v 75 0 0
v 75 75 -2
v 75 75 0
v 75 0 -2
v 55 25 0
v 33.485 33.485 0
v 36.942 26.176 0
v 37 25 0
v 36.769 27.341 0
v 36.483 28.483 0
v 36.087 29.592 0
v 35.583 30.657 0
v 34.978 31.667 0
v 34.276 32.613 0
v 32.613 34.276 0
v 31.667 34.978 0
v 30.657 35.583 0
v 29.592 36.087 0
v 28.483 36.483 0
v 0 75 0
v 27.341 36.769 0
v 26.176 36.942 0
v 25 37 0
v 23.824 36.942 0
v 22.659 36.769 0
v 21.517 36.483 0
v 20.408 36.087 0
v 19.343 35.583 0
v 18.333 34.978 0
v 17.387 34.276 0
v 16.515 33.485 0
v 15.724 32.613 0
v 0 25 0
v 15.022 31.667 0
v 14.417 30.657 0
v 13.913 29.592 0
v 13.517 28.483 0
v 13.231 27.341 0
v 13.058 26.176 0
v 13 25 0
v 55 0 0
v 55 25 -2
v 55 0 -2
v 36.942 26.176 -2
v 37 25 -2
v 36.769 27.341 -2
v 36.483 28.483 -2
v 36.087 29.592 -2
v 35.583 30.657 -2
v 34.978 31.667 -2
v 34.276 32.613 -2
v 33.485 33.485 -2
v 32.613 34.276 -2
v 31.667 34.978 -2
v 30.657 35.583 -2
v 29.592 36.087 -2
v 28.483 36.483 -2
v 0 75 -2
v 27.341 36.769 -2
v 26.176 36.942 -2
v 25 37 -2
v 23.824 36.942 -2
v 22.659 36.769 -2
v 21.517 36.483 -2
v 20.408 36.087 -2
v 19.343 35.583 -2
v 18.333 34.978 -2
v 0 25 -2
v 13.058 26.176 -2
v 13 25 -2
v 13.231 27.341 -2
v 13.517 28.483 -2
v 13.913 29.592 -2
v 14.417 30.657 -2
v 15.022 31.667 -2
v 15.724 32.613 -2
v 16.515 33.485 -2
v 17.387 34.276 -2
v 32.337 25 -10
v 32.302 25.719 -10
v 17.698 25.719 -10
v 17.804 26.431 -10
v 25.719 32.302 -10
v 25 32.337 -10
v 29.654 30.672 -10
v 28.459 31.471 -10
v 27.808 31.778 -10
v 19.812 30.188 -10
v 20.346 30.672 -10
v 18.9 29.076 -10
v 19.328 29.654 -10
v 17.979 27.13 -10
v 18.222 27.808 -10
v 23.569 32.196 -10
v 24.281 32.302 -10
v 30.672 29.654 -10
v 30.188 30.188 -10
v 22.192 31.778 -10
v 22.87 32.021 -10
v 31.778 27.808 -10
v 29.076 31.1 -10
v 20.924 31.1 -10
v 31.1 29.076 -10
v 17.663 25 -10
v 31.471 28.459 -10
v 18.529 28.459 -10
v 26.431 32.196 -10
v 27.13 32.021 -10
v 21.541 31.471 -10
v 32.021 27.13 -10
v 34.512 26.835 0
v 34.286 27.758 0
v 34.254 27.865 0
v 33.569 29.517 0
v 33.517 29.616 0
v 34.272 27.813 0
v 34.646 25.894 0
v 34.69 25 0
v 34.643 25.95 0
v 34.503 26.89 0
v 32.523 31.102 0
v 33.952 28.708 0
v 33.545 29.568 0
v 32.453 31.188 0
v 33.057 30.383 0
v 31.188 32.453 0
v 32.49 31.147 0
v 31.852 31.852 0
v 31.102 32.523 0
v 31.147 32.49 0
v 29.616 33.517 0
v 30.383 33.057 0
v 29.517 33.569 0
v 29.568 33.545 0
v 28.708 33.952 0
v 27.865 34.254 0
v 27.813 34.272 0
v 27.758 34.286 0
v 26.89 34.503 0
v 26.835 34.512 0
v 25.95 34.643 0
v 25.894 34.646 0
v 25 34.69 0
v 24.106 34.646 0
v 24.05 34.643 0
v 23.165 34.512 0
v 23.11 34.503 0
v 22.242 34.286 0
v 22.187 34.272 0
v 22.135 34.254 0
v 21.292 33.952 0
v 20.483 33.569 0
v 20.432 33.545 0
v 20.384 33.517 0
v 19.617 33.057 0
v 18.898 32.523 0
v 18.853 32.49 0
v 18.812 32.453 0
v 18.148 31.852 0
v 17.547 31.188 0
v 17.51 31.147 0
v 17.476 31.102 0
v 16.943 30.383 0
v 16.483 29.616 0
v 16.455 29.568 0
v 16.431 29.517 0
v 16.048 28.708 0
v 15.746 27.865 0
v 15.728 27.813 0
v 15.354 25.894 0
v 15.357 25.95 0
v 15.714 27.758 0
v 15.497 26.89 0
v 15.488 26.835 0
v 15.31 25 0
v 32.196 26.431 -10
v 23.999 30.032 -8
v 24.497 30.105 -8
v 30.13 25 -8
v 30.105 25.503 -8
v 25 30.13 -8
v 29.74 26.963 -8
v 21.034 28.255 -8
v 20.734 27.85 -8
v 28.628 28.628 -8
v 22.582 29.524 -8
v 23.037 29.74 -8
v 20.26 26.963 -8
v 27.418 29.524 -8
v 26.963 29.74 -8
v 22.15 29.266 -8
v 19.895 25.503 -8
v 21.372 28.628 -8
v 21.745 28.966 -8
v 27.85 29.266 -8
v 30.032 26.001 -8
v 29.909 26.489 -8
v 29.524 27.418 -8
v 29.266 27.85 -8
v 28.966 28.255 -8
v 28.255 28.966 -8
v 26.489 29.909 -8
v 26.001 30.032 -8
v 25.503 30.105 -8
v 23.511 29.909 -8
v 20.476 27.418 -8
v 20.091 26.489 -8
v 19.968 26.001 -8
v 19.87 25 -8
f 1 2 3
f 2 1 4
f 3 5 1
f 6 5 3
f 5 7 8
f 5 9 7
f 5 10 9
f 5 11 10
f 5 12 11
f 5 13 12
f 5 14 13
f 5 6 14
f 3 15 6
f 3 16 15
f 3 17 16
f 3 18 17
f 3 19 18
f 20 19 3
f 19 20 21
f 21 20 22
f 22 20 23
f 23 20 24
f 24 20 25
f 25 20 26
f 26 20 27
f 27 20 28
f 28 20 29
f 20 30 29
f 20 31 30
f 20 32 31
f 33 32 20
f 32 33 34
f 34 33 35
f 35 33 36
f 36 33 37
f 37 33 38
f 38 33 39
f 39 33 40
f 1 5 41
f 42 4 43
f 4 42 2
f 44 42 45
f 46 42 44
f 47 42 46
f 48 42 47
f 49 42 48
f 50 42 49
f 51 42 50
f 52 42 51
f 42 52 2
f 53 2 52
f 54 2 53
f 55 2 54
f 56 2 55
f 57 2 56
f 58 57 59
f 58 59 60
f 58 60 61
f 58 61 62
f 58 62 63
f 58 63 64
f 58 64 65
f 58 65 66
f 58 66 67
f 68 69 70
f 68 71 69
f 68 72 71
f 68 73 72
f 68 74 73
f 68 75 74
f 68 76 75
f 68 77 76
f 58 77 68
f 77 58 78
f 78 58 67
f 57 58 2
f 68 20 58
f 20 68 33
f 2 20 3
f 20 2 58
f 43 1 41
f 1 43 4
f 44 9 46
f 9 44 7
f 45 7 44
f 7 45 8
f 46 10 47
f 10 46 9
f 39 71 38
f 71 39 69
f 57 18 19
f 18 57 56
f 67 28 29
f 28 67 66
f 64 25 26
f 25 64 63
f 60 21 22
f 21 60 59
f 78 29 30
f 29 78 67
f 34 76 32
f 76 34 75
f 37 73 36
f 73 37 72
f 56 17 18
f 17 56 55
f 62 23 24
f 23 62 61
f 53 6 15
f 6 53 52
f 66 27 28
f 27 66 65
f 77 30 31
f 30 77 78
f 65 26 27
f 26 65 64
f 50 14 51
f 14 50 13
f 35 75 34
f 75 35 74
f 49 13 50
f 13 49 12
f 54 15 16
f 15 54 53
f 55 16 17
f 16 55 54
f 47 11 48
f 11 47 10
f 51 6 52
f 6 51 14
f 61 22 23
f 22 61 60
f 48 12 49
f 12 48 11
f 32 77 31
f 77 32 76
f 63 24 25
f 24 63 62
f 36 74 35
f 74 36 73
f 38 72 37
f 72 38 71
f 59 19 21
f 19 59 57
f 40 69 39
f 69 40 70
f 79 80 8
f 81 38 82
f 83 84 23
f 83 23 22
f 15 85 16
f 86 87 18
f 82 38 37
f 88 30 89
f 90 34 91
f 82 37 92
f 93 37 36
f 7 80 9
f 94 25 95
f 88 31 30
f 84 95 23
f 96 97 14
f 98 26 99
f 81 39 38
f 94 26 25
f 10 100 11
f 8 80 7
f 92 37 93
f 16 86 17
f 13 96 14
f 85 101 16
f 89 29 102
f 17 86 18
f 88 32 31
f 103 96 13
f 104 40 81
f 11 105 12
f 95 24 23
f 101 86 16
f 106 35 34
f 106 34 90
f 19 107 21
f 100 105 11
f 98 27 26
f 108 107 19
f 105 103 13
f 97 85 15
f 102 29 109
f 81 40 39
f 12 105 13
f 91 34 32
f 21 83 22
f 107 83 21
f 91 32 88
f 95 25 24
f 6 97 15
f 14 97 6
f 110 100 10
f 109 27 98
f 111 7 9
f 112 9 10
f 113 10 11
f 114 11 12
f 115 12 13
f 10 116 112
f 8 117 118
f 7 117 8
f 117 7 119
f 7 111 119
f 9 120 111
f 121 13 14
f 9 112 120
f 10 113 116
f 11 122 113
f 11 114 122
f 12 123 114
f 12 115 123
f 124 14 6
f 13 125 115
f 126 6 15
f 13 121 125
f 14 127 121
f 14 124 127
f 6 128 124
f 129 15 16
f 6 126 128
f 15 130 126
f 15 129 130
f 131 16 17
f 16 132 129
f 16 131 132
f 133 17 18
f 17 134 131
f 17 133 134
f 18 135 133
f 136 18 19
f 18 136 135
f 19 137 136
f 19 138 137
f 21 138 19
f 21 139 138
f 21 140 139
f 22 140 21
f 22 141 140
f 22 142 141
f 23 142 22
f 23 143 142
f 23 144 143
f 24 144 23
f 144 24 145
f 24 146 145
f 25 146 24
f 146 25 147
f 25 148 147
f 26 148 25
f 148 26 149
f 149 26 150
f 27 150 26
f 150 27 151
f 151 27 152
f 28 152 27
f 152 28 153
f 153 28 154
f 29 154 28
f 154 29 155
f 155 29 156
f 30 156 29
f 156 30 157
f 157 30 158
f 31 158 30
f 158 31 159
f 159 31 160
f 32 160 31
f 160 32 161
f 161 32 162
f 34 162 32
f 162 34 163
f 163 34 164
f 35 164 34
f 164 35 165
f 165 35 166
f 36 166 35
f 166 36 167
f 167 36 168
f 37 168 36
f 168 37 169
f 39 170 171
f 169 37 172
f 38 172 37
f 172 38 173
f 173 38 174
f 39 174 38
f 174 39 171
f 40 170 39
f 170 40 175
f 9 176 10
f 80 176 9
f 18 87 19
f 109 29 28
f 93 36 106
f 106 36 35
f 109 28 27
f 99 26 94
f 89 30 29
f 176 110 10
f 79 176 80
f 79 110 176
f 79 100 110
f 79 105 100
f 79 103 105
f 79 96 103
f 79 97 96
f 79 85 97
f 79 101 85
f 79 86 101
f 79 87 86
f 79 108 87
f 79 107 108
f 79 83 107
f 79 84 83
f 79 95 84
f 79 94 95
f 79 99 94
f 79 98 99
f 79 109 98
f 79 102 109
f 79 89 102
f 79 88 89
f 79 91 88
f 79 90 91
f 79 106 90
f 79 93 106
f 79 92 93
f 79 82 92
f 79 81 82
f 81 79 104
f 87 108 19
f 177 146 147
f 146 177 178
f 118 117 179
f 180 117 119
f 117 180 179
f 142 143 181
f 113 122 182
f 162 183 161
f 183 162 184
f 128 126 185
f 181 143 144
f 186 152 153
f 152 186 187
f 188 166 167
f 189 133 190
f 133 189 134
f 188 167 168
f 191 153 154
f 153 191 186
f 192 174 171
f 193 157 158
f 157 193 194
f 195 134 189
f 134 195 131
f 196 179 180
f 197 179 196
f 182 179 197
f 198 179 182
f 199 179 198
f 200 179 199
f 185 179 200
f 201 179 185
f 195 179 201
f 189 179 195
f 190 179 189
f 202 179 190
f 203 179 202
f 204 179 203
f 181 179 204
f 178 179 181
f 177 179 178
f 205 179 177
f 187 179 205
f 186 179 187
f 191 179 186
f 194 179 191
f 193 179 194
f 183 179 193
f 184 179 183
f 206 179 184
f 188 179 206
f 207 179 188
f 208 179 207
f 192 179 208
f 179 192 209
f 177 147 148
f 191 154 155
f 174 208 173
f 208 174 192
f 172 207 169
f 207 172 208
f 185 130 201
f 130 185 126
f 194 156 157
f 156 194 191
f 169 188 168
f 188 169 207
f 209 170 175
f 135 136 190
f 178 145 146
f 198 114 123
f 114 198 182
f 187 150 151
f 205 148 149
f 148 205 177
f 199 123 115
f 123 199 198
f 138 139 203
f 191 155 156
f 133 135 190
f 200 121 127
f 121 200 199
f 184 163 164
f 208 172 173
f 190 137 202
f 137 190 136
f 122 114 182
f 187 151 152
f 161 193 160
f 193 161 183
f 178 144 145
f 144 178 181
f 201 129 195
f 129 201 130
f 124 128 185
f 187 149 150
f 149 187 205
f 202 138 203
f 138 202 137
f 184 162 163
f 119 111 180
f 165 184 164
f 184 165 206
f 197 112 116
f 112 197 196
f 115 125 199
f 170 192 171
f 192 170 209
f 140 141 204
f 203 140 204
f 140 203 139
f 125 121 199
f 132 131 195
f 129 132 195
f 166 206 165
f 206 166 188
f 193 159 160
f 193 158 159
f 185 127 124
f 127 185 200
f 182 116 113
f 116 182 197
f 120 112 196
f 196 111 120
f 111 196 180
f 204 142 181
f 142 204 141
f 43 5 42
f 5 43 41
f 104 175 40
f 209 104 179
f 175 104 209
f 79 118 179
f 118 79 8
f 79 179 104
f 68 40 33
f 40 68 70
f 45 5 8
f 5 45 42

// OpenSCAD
// --------------------------------------------------------
// Parametric Sheet Metal Dimple / Dowel Simulation
// --------------------------------------------------------

module dimpled_plate(length, width, thickness, dimple_x, dimple_y, radius, depth, draft_angle) {
    
    // 1. Calculate horizontal thickness offset to maintain normal wall thickness
    t_h = thickness / cos(draft_angle);
    
    // 2. Calculate Outer Cone Radii (The exterior metal surface)
    r_out_top = radius;
    r_out_bot = radius - (depth + thickness) * tan(draft_angle);
    
    // 3. Calculate Inner Cone Radii (The air / stamping punch)
    r_in_top = r_out_top - t_h;
    r_in_bot = r_out_bot - t_h;

    union() {
        // --- BASE PLATE ---
        difference() {
            // Position plate so the top face is at Z = 0
            translate([0, 0, -thickness])
                cube([length, width, thickness]);
            
            // Cut a hole exactly where the dimple begins
            translate([dimple_x, dimple_y, -thickness - 1])
                cylinder(h = thickness + 2, r = radius, $fn = 64);
        }
        
        // --- DIMPLE SHELL ---
        translate([dimple_x, dimple_y, 0]) {
            difference() {
                // The Outer Solid (Metal)
                translate([0, 0, -(depth + thickness)])
                    cylinder(h = depth + thickness, r1 = r_out_bot, r2 = r_out_top, $fn = 64);
                    
                // The Inner Cutout (Air)
                // We make the height +1 to ensure a clean Boolean cut at the top
                translate([0, 0, -depth])
                    cylinder(h = depth + 1, r1 = r_in_bot, r2 = r_in_top + 1 * tan(draft_angle), $fn = 64);
            }
        }
    }
}

// ==========================================
// Example Render (With Cross-Section Cutaway)
// ==========================================

difference() {
    color("SteelBlue")
    dimpled_plate(
        length = 75, 
        width = 75, 
        thickness = 2, 
        dimple_x = 25, 
        dimple_y = 25, 
        radius = 12, 
        depth = 8, 
        draft_angle = 25
    );
    
    // Boolean cut to remove the front half of the plate.
    // This allows you to inspect the constant thickness of the cross-section.
    translate([-5, -5, -20])
        cube([60, 30, 40]); 
}
